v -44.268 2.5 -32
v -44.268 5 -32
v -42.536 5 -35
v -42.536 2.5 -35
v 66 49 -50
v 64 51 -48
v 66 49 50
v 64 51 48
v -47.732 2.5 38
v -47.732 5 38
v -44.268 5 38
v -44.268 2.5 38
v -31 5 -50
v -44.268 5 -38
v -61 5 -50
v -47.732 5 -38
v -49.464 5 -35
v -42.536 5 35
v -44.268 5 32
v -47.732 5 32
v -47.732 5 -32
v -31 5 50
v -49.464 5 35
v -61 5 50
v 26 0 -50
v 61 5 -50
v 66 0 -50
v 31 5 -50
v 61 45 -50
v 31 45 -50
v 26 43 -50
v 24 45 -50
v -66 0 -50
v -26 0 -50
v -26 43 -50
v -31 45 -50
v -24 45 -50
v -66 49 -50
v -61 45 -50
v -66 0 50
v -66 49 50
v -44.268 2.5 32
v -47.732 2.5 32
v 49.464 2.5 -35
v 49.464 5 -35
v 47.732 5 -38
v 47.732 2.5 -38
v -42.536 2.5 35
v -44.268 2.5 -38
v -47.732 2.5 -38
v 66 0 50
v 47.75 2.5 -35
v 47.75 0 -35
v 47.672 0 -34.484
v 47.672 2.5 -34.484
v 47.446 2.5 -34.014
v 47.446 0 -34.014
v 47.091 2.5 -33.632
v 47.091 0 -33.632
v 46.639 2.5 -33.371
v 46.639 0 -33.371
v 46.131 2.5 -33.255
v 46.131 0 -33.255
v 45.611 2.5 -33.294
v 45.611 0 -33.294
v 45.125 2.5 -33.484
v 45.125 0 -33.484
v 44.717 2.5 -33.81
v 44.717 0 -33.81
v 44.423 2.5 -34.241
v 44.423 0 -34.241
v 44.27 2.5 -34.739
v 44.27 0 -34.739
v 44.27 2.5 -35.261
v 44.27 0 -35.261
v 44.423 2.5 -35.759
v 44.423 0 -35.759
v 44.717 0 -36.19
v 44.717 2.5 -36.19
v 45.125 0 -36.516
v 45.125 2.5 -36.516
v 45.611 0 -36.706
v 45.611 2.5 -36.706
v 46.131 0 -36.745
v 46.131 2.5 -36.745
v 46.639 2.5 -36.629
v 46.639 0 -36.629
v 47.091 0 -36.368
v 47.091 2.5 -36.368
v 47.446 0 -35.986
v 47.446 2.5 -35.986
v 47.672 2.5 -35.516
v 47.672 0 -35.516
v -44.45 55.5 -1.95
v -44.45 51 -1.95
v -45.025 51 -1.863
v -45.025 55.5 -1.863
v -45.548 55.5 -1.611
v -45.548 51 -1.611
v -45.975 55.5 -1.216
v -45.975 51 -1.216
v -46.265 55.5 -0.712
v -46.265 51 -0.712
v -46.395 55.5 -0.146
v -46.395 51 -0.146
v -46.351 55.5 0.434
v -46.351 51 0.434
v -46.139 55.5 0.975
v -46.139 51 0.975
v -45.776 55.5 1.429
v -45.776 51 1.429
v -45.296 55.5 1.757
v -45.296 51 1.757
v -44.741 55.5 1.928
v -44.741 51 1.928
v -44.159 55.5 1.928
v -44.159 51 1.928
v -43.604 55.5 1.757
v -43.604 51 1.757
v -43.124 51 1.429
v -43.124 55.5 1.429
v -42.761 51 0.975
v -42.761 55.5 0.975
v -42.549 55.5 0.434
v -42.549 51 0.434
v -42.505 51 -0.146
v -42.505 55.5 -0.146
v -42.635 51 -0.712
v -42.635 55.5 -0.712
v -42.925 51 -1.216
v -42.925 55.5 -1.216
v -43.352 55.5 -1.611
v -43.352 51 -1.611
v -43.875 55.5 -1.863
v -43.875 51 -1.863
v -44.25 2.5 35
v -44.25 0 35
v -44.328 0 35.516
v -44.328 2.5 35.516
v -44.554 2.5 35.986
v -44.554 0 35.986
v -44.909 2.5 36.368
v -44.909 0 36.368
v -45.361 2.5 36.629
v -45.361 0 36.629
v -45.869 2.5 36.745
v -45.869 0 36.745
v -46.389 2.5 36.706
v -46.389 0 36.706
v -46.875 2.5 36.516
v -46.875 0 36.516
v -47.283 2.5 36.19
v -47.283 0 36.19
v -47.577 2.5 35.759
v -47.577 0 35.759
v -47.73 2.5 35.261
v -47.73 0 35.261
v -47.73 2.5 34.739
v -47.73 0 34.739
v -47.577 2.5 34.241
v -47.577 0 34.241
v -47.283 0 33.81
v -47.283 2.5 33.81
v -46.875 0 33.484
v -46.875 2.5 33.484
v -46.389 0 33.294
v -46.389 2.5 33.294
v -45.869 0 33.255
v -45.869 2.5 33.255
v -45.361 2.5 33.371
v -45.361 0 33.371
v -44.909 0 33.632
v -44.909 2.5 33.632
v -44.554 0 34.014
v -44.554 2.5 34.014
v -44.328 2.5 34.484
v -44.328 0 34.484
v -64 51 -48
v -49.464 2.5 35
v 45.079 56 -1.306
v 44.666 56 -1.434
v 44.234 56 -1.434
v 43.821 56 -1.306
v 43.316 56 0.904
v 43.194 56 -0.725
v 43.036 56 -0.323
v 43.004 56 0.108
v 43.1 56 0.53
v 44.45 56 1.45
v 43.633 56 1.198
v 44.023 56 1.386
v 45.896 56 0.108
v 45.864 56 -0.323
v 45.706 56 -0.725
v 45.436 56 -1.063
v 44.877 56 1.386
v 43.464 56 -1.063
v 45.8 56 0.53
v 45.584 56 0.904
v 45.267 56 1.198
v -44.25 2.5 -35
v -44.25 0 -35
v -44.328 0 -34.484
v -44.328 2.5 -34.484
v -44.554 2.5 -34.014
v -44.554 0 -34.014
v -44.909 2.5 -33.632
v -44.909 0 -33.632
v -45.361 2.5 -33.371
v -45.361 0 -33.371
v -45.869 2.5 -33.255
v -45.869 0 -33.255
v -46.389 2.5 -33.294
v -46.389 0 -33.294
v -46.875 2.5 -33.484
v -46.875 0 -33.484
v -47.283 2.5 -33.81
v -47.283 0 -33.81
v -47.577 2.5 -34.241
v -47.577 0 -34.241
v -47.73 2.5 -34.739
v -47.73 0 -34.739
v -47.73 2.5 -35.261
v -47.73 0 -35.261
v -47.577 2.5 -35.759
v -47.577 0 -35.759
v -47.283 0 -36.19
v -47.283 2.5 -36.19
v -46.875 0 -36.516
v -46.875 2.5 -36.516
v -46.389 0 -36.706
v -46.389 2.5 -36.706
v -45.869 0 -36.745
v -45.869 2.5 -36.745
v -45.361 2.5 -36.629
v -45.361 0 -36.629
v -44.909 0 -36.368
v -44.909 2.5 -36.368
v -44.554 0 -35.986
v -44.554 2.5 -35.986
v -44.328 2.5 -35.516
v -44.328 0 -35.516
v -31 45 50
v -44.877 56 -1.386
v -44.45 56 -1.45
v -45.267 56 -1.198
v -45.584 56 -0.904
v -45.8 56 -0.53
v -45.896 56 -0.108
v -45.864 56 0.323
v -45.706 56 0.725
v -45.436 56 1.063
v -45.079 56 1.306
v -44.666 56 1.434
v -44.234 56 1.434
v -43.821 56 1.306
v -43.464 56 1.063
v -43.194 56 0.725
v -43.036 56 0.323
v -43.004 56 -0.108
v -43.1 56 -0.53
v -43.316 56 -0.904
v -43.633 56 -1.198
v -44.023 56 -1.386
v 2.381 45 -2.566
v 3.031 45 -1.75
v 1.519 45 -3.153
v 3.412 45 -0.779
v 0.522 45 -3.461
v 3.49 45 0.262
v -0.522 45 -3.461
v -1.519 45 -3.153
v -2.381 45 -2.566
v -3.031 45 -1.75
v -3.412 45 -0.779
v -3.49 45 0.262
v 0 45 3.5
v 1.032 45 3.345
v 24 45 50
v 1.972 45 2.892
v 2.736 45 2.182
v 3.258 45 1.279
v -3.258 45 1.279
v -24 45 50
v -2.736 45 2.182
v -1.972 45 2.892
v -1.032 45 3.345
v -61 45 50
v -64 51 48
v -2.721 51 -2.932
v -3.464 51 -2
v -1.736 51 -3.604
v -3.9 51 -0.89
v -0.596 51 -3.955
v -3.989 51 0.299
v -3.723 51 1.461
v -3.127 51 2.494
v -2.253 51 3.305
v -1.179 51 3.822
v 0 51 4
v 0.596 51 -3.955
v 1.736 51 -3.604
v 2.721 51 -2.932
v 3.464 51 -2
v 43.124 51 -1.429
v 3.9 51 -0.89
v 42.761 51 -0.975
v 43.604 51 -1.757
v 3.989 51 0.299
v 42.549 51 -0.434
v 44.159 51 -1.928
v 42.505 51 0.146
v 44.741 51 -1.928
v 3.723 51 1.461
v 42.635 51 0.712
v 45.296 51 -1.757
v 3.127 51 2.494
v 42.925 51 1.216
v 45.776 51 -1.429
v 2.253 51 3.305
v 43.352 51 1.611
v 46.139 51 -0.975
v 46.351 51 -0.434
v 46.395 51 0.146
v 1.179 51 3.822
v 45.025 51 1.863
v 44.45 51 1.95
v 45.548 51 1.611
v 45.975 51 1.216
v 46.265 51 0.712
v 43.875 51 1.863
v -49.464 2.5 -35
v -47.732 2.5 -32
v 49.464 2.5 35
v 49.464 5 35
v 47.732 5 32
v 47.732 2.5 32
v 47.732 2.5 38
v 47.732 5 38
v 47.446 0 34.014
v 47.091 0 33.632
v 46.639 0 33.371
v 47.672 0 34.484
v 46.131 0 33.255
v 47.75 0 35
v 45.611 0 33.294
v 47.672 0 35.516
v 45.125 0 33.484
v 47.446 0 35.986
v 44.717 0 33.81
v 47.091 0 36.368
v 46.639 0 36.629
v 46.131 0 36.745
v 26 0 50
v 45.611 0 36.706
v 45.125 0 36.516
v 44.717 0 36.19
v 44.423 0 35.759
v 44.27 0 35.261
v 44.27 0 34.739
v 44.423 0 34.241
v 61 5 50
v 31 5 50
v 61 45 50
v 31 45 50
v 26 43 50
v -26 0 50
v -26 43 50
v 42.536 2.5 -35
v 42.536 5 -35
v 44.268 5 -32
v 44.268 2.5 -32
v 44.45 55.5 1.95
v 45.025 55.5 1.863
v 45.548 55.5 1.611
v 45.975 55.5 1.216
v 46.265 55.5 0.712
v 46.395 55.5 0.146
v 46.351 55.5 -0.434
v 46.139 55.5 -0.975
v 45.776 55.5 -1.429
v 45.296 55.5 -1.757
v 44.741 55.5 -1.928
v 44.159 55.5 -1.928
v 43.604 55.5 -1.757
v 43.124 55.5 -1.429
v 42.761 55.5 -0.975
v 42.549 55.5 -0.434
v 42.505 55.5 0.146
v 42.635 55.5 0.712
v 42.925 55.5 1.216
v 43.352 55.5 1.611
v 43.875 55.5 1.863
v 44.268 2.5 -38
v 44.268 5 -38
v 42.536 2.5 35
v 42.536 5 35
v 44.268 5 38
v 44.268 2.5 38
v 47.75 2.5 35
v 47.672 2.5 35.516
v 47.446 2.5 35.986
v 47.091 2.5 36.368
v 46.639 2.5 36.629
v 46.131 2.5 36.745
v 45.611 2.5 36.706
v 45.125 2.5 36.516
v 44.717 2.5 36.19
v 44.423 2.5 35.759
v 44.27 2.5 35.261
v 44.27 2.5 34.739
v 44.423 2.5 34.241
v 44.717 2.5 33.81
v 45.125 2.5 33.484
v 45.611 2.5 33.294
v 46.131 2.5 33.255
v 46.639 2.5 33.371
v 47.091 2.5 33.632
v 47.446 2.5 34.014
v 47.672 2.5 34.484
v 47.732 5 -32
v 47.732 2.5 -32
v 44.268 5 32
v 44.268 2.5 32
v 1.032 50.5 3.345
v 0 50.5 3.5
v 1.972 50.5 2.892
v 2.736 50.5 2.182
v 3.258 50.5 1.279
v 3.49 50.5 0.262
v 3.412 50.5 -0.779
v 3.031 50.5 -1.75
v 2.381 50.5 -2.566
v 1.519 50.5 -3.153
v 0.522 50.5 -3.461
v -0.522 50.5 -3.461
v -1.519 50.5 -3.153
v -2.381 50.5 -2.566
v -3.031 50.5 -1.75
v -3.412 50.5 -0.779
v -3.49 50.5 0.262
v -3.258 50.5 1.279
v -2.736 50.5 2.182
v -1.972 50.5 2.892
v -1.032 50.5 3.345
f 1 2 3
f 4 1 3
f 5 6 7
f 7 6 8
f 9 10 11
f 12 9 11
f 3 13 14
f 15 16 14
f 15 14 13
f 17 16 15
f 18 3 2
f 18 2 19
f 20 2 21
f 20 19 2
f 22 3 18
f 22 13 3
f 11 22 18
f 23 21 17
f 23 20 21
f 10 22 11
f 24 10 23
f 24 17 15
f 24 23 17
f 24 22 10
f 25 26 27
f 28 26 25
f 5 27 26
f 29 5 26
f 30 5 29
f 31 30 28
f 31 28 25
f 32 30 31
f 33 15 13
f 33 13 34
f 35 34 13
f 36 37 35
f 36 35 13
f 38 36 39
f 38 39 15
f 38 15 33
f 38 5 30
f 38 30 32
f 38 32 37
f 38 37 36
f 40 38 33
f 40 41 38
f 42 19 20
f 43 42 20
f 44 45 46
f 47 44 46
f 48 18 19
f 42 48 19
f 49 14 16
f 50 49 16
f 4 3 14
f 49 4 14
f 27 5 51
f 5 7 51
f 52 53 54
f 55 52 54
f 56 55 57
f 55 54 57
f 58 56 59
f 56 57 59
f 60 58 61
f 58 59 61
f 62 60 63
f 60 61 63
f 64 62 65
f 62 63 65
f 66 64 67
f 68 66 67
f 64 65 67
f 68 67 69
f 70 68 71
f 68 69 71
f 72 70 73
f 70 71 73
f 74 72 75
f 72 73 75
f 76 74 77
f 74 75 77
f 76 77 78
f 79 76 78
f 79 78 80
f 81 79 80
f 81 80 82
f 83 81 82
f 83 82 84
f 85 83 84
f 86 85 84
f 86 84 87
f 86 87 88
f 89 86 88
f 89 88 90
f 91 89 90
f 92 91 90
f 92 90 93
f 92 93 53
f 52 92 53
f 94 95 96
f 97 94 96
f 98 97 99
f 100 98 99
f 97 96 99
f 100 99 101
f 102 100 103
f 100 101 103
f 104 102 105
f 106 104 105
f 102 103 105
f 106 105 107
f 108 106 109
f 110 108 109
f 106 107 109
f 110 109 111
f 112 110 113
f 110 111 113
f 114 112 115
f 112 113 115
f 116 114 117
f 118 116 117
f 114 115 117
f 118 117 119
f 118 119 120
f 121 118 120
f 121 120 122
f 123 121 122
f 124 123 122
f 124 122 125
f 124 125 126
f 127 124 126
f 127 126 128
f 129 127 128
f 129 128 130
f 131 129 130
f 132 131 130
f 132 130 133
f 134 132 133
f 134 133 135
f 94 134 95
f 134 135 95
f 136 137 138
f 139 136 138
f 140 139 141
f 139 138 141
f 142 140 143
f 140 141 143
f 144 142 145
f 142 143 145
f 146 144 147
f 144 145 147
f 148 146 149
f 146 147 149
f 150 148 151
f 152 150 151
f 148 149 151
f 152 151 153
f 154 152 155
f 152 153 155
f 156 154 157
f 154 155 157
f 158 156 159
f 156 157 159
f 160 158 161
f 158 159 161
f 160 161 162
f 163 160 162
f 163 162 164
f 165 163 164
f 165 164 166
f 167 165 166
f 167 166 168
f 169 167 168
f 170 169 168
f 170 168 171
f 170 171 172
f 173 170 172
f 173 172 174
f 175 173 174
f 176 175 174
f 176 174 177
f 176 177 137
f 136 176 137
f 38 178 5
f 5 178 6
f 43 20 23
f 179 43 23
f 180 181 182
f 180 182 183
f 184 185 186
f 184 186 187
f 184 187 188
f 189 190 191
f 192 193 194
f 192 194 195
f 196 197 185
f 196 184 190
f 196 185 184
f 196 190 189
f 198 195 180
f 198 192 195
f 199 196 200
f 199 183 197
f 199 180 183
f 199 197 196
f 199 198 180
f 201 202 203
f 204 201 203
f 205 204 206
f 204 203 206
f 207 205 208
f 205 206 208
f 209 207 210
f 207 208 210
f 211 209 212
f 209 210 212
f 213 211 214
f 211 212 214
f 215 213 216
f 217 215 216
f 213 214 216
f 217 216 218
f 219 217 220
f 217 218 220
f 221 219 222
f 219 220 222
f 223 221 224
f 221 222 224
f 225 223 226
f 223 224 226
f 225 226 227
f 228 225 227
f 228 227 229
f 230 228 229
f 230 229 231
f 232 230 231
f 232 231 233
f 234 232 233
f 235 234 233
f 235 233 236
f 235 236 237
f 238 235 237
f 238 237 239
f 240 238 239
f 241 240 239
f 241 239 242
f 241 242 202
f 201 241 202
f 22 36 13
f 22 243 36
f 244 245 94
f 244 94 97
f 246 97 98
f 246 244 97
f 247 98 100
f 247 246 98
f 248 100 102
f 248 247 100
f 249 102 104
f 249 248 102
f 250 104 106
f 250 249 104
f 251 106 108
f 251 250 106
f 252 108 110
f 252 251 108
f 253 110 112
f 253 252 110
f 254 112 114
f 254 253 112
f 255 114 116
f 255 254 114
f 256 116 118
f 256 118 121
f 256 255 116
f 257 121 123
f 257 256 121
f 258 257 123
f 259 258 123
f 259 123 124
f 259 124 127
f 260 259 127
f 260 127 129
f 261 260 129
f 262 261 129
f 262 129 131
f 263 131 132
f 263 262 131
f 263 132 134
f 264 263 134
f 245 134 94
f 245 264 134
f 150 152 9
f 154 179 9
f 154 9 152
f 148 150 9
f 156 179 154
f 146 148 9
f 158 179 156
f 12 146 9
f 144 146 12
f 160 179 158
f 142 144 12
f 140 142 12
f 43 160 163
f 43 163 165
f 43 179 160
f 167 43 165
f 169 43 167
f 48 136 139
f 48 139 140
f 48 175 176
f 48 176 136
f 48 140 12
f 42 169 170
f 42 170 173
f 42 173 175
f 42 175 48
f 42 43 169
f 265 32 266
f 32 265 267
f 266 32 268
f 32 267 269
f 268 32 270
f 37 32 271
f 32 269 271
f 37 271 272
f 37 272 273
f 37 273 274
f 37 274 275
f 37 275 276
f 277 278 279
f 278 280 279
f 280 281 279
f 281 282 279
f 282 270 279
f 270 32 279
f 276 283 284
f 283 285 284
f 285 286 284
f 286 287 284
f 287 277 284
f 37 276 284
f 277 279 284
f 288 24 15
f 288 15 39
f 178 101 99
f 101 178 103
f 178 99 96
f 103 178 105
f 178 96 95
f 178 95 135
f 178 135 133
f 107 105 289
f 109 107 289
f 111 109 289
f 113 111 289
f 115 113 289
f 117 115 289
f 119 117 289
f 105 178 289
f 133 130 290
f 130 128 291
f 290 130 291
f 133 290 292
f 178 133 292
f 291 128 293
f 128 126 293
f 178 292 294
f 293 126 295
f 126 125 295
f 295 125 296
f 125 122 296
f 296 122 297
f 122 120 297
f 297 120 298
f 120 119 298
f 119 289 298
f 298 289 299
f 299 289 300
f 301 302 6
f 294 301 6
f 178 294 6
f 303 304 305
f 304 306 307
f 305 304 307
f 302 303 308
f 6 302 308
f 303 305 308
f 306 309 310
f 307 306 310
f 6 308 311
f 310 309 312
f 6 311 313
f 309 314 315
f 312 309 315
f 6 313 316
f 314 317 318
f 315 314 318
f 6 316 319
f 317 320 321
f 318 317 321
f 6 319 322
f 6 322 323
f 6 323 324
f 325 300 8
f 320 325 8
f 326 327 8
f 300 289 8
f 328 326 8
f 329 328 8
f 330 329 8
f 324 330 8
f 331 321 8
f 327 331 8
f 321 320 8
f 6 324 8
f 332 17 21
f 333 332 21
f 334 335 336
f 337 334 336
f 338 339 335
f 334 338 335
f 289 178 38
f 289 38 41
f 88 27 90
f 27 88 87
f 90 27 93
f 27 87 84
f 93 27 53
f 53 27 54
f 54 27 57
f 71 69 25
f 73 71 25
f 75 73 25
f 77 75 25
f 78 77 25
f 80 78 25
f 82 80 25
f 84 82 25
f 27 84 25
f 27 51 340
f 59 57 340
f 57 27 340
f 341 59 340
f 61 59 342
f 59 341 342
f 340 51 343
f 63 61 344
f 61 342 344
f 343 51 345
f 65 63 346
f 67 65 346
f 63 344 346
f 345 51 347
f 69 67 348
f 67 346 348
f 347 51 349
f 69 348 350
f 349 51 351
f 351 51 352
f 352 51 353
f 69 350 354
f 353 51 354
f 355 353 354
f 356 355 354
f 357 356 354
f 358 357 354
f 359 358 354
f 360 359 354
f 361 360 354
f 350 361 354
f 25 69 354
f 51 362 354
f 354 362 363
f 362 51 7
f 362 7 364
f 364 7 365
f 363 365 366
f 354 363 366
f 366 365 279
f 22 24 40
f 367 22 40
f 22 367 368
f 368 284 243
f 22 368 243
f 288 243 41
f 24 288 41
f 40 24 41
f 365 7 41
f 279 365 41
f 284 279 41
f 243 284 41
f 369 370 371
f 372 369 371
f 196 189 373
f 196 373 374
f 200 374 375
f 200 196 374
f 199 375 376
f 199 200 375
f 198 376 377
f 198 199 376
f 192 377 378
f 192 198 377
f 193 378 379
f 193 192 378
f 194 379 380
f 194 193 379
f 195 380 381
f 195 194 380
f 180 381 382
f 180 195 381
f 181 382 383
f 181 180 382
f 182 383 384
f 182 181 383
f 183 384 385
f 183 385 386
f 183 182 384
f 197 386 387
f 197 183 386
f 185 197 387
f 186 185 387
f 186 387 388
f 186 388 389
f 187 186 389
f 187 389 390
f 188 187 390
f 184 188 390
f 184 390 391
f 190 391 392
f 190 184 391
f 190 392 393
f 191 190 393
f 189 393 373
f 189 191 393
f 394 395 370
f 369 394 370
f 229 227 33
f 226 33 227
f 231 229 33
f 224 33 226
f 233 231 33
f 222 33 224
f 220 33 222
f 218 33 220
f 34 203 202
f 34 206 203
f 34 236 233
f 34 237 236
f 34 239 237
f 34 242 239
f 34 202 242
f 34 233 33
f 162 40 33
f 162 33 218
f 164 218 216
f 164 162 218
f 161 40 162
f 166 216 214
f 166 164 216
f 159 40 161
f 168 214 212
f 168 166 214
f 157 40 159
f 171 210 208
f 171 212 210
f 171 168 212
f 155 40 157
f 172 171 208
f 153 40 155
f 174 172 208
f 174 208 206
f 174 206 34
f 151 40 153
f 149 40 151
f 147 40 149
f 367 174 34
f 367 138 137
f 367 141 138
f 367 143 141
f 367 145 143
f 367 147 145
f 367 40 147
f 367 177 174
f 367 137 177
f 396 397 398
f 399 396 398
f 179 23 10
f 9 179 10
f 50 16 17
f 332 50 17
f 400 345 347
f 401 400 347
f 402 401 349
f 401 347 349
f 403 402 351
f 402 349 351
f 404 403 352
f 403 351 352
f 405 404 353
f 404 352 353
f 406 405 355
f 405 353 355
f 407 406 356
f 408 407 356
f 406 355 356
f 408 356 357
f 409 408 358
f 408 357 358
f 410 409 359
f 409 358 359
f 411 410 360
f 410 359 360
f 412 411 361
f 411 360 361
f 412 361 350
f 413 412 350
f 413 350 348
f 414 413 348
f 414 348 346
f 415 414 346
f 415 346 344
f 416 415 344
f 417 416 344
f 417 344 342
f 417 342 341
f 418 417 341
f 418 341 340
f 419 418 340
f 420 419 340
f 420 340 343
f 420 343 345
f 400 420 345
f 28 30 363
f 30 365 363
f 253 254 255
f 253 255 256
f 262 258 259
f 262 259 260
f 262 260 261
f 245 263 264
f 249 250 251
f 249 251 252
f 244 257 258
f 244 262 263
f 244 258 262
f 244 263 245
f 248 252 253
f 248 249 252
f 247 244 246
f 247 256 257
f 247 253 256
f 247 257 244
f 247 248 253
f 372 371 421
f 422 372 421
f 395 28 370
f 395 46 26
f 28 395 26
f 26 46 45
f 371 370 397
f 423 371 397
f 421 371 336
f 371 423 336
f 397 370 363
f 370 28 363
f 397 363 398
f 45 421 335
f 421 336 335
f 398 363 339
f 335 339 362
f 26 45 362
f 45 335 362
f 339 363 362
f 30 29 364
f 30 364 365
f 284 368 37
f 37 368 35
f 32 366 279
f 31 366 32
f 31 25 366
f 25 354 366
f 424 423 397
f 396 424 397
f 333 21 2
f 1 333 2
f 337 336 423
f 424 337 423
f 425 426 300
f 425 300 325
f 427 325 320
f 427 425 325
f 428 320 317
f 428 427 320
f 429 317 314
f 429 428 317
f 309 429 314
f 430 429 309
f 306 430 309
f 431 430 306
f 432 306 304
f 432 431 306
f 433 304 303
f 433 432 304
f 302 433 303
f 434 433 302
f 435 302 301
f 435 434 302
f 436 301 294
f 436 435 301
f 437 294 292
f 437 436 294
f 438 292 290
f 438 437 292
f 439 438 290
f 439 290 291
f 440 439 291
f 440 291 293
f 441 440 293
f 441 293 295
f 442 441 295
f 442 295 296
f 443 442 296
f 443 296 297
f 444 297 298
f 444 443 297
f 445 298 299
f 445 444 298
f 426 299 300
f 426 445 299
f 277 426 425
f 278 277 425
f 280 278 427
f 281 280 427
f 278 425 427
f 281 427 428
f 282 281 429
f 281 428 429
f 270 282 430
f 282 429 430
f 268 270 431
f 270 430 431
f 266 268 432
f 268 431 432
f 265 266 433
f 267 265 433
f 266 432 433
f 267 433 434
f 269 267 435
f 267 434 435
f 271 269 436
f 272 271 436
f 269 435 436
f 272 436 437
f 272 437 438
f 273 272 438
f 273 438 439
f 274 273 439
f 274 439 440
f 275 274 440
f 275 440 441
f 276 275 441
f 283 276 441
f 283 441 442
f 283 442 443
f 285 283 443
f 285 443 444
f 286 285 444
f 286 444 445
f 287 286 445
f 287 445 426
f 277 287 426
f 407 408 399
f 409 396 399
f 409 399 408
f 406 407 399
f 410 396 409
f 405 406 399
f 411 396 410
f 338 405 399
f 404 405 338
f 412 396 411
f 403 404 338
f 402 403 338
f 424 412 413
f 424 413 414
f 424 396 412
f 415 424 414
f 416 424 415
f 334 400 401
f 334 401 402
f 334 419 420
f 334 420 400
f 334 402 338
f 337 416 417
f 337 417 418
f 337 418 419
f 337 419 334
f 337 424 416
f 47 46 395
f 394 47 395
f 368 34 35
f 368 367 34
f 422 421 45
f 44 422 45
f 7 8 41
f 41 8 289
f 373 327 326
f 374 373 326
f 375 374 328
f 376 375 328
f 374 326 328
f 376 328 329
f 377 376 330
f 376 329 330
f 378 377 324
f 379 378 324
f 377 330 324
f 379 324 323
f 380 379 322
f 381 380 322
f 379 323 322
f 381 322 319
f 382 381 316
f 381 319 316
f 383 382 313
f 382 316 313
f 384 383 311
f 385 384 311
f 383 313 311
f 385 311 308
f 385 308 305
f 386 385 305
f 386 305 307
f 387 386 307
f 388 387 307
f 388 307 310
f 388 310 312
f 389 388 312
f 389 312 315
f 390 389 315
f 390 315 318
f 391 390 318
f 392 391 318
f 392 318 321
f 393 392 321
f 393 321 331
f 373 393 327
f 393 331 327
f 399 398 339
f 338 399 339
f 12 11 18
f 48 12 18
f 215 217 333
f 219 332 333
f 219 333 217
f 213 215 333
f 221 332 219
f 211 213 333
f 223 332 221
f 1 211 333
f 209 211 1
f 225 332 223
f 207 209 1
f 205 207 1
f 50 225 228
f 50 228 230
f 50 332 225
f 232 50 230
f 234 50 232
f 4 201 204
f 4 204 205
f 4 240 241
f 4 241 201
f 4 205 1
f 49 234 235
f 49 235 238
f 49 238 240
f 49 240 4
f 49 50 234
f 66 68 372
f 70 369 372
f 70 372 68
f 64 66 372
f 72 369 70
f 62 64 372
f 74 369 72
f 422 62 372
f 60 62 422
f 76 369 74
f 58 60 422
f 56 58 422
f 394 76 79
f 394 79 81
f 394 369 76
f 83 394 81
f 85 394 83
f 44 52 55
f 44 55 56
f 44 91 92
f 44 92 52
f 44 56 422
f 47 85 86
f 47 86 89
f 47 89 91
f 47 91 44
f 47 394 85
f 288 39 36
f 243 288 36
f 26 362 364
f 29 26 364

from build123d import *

# Parameters (mm, degrees)
EXTRUDE_1_DEPTH     = 50
SKETCH_2_R          = 3.5
CUT_EXTRUDE_1_DEPTH = 98.247107926
SKETCH_3_R          = 1.95
EXTRUDE_2_DEPTH     = 5
CUT_EXTRUDE_2_REACH = 101.96
SKETCH_4_R          = 1.75
CHAMFER_1_SIZE      = 2
CHAMFER_2_SIZE      = 2
CHAMFER_3_SIZE      = 0.5
CUT_EXTRUDE_3_DEPTH = 2.5


with BuildPart() as part:
    # 草图1 → 凸台-拉伸1 (new, symmetric)
    with BuildSketch(Plane.XY):
        Polygon((-26, 45), (0, 45), (0, 49.079214745), (0, 51), (-60, 51), (-66, 51), (-66, 5), (-66, 0), (-55, 0), (-26, 0), align=None)
        Polygon((-31, 5), (-61, 5), (-61, 45), (-55, 45), (-31, 45), align=None, mode=Mode.SUBTRACT)
    extrude_1 = extrude(amount=EXTRUDE_1_DEPTH, both=True)

    # 镜向1: 凸台-拉伸1 across plane
    add(extrude_1.mirror(Plane(origin=(0, 0, 50), x_dir=(0, 0, 1), z_dir=(1, 0, 0))))

    # 草图2 → 切除-拉伸1 (cut, through all)
    with BuildSketch(Plane(origin=(0, 51, 0), x_dir=(1, 0, 0), z_dir=(0, 1, 0))):
        with Locations(Location((0, 0, 0), (0, 0, 270))):
            Circle(SKETCH_2_R)
    extrude(amount=-CUT_EXTRUDE_1_DEPTH, mode=Mode.SUBTRACT)

    # 草图3 → 凸台-拉伸2 (add)
    with BuildSketch(Plane(origin=(0, 51, 0), x_dir=(1, 0, 0), z_dir=(0, 1, 0))):
        with Locations(Location((44.45, 0, 0), (0, 0, 270))):
            Circle(SKETCH_3_R)
        with Locations(Location((-44.45, 0, 0), (0, 0, 90))):
            Circle(SKETCH_3_R)
    extrude(amount=EXTRUDE_2_DEPTH)

    # 草图4 → 切除-拉伸2 (cut, up to next)
    with BuildSketch(Plane.XZ, mode=Mode.PRIVATE) as cut_extrude_2_sk1:
        with Locations((-46, 35)):
            Circle(SKETCH_4_R)
    cut_extrude_2_tool1 = extrude(cut_extrude_2_sk1.sketch, amount=-CUT_EXTRUDE_2_REACH, mode=Mode.PRIVATE) & part.part
    # 草图4 → 切除-拉伸2 (cut, up to next)
    with BuildSketch(Plane.XZ, mode=Mode.PRIVATE) as cut_extrude_2_sk2:
        with Locations((46, 35)):
            Circle(SKETCH_4_R)
    cut_extrude_2_tool2 = extrude(cut_extrude_2_sk2.sketch, amount=-CUT_EXTRUDE_2_REACH, mode=Mode.PRIVATE) & part.part
    # 草图4 → 切除-拉伸2 (cut, up to next)
    with BuildSketch(Plane.XZ, mode=Mode.PRIVATE) as cut_extrude_2_sk3:
        with Locations((46, -35)):
            Circle(SKETCH_4_R)
    cut_extrude_2_tool3 = extrude(cut_extrude_2_sk3.sketch, amount=-CUT_EXTRUDE_2_REACH, mode=Mode.PRIVATE) & part.part
    # 草图4 → 切除-拉伸2 (cut, up to next)
    with BuildSketch(Plane.XZ, mode=Mode.PRIVATE) as cut_extrude_2_sk4:
        with Locations((-46, -35)):
            Circle(SKETCH_4_R)
    cut_extrude_2_tool4 = extrude(cut_extrude_2_sk4.sketch, amount=-CUT_EXTRUDE_2_REACH, mode=Mode.PRIVATE) & part.part
    add(cut_extrude_2_tool1.solids().sort_by_distance((-46, 0, 35))[0], mode=Mode.SUBTRACT)
    add(cut_extrude_2_tool2.solids().sort_by_distance((46, 0, 35))[0], mode=Mode.SUBTRACT)
    add(cut_extrude_2_tool3.solids().sort_by_distance((46, 0, -35))[0], mode=Mode.SUBTRACT)
    add(cut_extrude_2_tool4.solids().sort_by_distance((-46, 0, -35))[0], mode=Mode.SUBTRACT)

    # 倒角1
    chamfer_1_edges = [part.edges().sort_by_distance(p)[0] for p in [
        (-26, 45, 0),
        (26, 45, 0),
    ]]
    chamfer(chamfer_1_edges, length=CHAMFER_1_SIZE)

    # 倒角2
    chamfer_2_edges = [part.edges().sort_by_distance(p)[0] for p in [
        (0, 51, -50),
        (-66, 51, 0),
        (66, 51, 0),
        (0, 51, 50),
    ]]
    chamfer(chamfer_2_edges, length=CHAMFER_2_SIZE)

    # 倒角3
    chamfer_3_edges = [part.edges().sort_by_distance(p)[0] for p in [
        (0, 51, -3.5),
        (44.45, 56, -1.95),
        (-44.45, 56, 1.95),
    ]]
    chamfer(chamfer_3_edges, length=CHAMFER_3_SIZE)

    # 草图6 → 切除-拉伸3 (cut)
    with BuildSketch(Plane(origin=(0, 5, 0), x_dir=(1, 0, 0), z_dir=(0, 1, 0))):
        Polygon((42.535898385, 35), (44.267949192, 32), (47.732050808, 32), (49.464101615, 35), (47.732050808, 38), (44.267949192, 38), align=None)
        Polygon((-47.732050808, 32), (-44.267949192, 32), (-42.535898385, 35), (-44.267949192, 38), (-47.732050808, 38), (-49.464101615, 35), align=None)
        Polygon((-47.732050808, -38), (-44.267949192, -38), (-42.535898385, -35), (-44.267949192, -32), (-47.732050808, -32), (-49.464101615, -35), align=None)
        Polygon((42.535898385, -35), (44.267949192, -38), (47.732050808, -38), (49.464101615, -35), (47.732050808, -32), (44.267949192, -32), align=None)
    extrude(amount=-CUT_EXTRUDE_3_DEPTH, mode=Mode.SUBTRACT)


solid = part.part
